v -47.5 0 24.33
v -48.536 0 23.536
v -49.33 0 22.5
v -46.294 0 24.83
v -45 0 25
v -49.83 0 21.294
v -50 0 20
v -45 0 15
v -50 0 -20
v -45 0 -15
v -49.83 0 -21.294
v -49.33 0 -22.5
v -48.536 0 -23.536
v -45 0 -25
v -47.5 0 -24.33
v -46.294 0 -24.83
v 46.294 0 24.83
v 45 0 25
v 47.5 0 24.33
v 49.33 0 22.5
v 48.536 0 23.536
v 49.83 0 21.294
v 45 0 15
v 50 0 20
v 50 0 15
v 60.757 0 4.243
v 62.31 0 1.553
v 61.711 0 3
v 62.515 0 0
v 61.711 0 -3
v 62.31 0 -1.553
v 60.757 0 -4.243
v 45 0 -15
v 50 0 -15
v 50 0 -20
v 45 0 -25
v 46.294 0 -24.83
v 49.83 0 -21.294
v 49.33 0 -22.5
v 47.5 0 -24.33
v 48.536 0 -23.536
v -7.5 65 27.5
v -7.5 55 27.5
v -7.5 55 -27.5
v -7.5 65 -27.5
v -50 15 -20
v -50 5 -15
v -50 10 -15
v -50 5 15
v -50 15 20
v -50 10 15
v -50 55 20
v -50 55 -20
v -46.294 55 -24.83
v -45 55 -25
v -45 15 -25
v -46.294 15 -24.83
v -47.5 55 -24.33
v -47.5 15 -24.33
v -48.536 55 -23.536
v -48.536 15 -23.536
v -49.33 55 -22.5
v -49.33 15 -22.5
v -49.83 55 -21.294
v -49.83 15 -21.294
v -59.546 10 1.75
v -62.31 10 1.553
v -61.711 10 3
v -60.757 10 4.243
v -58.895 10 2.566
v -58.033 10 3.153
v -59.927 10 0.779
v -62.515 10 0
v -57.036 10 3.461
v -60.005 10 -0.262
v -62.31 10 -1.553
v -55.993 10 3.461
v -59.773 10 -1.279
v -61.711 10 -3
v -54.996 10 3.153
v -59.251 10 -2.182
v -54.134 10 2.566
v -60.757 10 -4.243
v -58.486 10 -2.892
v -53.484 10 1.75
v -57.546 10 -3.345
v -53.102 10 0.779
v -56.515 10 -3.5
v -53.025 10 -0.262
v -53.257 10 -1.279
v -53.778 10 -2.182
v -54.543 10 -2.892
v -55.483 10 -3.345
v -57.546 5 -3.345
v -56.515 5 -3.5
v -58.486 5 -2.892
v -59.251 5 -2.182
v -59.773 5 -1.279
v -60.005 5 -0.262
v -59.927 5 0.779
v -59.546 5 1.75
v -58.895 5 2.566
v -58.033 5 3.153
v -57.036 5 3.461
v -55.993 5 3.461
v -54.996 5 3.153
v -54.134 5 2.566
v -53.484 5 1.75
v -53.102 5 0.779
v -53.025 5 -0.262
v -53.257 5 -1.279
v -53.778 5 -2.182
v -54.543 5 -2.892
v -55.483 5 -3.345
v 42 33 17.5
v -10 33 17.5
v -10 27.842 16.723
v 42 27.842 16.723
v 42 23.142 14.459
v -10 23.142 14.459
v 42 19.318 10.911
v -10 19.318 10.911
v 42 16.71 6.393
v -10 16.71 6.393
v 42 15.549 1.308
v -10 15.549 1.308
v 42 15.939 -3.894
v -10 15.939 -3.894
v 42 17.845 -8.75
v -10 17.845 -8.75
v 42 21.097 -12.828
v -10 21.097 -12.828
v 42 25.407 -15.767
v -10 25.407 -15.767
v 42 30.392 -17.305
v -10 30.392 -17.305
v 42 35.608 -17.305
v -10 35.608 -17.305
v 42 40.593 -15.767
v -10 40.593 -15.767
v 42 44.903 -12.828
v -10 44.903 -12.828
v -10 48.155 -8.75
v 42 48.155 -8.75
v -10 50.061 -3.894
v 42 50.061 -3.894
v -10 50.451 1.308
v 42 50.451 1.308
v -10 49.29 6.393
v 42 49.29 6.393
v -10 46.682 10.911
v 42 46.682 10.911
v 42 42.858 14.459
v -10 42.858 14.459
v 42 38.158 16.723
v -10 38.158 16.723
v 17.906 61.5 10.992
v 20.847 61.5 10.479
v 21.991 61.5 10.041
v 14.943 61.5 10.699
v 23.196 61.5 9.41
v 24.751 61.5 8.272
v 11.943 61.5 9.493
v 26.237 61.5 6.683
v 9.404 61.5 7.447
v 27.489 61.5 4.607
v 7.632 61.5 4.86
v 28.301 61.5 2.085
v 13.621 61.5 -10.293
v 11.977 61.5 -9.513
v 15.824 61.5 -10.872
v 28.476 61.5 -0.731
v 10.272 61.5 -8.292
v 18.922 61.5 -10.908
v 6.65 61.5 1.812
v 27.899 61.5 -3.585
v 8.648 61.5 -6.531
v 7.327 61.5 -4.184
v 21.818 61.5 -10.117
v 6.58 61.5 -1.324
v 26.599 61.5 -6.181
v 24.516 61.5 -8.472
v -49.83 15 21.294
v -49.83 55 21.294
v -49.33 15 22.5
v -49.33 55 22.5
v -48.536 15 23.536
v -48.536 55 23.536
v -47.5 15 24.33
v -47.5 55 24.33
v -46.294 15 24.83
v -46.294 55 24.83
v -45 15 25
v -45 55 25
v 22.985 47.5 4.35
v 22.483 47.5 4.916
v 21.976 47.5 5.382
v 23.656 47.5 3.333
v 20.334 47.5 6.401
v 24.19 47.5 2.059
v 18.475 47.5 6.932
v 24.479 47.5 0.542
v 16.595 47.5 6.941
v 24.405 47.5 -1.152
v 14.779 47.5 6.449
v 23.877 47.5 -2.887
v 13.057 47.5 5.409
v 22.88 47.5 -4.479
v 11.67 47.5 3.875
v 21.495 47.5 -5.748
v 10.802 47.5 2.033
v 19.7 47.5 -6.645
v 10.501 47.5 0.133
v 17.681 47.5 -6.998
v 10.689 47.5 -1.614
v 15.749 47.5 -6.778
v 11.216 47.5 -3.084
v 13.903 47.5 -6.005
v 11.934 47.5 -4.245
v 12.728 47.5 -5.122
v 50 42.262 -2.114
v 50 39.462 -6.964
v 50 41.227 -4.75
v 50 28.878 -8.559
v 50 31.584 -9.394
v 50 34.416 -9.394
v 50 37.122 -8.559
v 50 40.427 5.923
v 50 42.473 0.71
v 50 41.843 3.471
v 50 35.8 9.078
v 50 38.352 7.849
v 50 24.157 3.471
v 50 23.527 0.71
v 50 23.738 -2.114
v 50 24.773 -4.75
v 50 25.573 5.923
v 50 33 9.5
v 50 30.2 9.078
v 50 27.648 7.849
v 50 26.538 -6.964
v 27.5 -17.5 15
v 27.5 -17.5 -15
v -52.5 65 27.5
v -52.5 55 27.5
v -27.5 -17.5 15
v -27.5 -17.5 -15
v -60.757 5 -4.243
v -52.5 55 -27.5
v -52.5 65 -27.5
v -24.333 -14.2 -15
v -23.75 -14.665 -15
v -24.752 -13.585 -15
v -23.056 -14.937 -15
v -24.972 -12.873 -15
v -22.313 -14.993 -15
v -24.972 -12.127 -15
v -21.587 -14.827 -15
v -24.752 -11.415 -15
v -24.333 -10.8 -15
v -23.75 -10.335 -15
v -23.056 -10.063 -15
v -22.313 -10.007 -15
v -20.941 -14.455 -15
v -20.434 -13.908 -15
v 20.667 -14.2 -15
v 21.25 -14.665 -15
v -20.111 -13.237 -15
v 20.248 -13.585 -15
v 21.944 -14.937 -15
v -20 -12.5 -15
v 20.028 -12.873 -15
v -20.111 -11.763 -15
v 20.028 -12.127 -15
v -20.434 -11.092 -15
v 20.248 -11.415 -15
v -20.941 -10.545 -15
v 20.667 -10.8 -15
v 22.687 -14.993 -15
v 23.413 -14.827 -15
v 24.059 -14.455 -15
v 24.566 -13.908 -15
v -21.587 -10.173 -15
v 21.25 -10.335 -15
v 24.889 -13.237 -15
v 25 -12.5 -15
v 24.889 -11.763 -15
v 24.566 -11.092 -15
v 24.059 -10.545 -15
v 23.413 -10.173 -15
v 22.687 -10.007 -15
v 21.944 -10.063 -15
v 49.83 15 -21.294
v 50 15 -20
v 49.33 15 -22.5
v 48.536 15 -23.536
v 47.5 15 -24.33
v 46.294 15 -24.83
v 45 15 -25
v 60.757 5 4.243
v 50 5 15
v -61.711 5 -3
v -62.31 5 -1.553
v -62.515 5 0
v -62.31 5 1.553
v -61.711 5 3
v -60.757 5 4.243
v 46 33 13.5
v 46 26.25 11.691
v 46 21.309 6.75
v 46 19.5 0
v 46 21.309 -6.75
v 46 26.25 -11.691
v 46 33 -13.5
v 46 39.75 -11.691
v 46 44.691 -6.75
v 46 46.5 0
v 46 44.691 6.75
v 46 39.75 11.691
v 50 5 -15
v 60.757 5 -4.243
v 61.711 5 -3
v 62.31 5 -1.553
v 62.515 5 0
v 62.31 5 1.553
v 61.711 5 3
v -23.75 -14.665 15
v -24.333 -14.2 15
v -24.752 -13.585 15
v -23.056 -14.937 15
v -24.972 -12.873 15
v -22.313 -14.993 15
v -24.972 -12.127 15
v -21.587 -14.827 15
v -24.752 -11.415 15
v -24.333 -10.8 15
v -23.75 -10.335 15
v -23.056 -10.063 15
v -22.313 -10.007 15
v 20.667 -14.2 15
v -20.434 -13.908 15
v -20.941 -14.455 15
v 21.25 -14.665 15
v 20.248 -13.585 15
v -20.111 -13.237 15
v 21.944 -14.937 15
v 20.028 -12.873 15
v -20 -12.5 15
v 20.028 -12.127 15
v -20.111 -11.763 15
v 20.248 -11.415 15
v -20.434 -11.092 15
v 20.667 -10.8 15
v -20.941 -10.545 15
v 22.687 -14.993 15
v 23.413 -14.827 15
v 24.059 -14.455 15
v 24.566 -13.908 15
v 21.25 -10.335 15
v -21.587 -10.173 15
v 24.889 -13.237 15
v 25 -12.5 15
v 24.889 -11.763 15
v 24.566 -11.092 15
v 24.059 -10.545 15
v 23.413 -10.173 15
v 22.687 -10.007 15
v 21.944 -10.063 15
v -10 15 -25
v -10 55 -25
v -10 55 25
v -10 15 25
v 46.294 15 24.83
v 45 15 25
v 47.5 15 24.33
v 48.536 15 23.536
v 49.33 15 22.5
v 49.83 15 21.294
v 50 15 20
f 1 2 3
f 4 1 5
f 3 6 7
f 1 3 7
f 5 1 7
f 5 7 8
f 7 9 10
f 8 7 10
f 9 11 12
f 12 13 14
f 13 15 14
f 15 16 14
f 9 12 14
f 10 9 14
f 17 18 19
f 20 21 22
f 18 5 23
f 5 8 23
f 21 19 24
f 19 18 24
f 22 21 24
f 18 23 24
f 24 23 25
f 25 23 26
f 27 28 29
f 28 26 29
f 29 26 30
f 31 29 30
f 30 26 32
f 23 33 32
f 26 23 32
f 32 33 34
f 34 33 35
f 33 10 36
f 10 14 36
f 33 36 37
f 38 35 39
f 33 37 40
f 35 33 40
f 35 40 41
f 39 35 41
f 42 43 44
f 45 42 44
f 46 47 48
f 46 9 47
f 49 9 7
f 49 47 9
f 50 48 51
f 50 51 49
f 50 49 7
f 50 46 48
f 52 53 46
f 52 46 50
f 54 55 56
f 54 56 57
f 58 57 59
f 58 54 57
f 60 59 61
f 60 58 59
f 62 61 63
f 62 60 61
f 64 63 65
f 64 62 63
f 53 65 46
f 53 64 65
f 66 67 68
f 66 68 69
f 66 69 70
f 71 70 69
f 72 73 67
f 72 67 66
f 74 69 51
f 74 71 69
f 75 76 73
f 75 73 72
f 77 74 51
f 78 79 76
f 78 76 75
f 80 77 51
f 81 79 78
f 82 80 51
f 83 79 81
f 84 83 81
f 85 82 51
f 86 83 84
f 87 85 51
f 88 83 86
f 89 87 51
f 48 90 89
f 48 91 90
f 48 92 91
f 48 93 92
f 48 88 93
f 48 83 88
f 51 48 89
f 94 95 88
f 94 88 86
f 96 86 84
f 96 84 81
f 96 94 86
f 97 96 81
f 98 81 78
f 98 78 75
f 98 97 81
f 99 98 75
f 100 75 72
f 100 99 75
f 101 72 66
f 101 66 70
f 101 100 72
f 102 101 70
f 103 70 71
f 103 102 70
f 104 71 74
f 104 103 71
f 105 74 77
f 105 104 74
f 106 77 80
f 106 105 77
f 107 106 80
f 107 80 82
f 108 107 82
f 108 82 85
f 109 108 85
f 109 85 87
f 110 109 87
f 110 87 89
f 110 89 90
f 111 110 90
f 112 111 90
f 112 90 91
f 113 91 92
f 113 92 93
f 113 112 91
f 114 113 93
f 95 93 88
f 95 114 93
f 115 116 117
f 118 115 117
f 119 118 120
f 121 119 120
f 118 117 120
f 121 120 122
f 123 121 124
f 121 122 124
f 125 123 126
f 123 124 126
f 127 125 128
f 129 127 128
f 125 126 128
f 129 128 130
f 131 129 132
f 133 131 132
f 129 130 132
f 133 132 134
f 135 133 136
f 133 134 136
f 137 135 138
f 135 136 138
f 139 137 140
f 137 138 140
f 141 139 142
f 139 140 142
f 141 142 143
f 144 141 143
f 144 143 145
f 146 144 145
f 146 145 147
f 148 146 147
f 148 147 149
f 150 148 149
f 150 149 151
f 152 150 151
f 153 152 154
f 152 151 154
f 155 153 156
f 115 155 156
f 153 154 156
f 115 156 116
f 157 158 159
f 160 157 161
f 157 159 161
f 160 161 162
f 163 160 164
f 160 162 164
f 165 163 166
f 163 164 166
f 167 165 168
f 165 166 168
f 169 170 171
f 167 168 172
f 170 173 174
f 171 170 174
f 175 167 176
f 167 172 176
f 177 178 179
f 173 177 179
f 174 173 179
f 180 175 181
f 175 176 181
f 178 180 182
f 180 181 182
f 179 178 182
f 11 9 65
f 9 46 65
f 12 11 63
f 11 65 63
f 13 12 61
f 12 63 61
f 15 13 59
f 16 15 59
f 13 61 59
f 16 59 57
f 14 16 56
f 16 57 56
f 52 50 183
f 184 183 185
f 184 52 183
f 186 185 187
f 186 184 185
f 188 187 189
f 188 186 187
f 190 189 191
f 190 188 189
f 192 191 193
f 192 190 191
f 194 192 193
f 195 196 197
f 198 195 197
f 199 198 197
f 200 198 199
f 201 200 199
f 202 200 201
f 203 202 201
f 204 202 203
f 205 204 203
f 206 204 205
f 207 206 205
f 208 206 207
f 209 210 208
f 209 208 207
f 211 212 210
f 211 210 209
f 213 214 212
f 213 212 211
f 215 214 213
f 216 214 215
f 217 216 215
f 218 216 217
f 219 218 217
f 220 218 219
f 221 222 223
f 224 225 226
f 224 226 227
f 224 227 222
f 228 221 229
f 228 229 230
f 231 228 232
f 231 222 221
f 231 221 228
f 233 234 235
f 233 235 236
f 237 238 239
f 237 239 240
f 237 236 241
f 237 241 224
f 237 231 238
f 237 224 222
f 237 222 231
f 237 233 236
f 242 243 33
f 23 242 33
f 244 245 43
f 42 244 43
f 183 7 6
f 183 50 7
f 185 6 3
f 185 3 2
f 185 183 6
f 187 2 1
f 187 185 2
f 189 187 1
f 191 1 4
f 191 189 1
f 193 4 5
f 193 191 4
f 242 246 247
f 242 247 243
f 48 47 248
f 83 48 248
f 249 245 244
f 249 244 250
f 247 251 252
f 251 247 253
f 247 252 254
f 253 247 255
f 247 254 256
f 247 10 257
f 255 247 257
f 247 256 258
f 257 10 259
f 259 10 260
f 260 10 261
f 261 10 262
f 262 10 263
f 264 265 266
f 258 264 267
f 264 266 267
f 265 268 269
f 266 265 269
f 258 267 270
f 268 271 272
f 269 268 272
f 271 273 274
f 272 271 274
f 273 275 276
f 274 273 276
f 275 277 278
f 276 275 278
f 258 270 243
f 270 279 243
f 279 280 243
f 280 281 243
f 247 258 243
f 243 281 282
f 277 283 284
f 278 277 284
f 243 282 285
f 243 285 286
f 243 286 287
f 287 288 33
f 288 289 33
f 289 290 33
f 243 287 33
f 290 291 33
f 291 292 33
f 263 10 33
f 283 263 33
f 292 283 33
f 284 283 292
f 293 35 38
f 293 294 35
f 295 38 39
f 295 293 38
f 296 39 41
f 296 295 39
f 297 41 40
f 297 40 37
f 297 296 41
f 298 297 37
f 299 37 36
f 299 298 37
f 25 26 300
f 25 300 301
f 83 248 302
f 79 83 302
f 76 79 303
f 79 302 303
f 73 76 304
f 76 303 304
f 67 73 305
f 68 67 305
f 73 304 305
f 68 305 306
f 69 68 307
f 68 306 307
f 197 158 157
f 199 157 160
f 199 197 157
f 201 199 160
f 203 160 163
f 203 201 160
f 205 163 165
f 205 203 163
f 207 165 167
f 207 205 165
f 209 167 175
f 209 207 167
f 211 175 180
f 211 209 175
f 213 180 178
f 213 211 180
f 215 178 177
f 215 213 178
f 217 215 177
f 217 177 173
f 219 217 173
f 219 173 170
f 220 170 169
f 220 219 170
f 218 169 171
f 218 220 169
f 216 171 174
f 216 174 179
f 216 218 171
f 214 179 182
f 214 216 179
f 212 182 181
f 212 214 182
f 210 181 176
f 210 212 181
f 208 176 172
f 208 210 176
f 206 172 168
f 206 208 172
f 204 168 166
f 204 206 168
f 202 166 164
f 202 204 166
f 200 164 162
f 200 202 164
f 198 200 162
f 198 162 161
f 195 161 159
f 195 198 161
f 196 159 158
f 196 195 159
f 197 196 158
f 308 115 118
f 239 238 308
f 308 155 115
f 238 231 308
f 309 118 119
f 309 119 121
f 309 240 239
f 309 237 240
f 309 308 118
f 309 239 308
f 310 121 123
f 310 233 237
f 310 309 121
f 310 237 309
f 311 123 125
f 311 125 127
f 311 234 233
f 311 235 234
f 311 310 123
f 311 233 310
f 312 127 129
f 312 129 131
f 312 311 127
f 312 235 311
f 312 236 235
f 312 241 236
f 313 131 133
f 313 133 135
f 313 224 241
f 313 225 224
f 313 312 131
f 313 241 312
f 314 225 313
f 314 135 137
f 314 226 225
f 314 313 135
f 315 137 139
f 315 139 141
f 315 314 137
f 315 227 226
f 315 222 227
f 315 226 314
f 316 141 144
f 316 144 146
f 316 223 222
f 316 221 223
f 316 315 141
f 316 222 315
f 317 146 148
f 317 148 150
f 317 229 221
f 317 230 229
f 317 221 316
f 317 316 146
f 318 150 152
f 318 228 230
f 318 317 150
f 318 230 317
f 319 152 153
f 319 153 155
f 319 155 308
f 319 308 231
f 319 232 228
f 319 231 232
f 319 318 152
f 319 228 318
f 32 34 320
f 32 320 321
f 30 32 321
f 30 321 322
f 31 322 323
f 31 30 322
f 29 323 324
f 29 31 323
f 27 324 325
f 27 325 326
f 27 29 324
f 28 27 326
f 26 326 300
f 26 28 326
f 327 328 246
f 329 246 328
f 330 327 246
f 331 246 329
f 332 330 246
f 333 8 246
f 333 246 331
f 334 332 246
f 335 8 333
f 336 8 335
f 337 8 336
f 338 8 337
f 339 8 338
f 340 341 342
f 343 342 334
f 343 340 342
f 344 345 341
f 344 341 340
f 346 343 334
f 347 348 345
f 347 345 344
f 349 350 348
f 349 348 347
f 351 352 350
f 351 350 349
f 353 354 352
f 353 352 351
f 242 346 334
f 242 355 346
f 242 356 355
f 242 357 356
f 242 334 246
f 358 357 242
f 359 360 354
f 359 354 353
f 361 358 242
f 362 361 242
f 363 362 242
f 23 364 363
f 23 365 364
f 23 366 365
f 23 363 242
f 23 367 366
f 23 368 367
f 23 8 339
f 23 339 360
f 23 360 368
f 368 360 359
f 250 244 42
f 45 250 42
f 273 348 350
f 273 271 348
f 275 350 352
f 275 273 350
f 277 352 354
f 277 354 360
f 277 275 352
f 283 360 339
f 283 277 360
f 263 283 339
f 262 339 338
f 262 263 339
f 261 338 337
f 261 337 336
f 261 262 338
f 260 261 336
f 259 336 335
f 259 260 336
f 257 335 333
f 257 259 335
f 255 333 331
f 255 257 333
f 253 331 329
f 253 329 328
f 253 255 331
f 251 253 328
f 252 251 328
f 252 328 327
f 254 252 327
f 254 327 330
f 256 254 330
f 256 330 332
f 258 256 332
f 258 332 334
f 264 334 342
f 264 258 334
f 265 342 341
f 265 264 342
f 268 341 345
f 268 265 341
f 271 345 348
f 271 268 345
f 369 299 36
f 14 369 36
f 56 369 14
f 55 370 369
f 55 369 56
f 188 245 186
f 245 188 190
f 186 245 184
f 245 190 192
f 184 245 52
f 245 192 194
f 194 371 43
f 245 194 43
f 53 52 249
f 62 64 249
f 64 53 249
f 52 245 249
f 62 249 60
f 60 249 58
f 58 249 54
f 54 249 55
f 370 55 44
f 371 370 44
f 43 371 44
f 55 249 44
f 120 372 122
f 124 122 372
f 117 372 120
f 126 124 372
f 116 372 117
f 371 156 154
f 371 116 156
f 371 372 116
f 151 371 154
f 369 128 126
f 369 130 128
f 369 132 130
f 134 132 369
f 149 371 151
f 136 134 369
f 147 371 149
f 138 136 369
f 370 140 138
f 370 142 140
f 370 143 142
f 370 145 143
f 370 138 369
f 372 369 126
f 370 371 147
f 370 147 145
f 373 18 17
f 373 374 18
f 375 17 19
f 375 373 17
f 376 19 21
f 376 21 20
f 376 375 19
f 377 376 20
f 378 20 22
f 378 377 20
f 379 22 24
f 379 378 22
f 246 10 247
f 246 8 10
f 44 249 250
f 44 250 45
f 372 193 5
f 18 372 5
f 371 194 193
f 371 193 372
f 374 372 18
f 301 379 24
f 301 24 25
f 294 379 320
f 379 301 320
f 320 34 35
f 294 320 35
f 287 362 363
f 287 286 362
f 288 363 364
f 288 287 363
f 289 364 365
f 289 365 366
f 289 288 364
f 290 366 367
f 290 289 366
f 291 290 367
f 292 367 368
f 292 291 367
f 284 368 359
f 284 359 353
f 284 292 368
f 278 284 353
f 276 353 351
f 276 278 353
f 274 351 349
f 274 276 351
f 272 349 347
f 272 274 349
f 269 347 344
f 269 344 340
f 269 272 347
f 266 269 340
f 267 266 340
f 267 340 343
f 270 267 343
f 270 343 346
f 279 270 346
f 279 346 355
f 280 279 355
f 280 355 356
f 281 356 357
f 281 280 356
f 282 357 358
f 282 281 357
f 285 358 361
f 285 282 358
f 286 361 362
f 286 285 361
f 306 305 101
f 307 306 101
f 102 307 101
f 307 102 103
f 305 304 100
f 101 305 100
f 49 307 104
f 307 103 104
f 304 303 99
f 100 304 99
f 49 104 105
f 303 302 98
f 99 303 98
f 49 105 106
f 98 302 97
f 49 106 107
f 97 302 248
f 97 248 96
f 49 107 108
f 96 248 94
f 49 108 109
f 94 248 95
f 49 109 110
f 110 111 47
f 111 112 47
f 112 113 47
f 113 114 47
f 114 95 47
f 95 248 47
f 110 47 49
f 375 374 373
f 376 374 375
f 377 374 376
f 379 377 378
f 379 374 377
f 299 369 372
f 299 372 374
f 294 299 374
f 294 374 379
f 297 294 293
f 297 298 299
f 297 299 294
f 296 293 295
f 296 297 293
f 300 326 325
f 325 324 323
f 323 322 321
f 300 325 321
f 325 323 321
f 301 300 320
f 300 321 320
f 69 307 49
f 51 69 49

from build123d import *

# Parameters (mm, degrees)
SKETCH1_W           = 100
SKETCH1_H           = 50
BOSS_EXTRUDE1_DEPTH = 15
SHELL1_T            = -5
FILLET1_R           = 5
SKETCH2_R           = 2.5
BOSS_EXTRUDE2_DEPTH = 15
BOSS_EXTRUDE3_DEPTH = 5
BOSS_EXTRUDE4_START = 5
SKETCH4_R           = 3.5
BOSS_EXTRUDE4_DEPTH = 5
SKETCH5_W           = 90
SKETCH5_H           = 40
BOSS_EXTRUDE5_DEPTH = 10
BOSS_EXTRUDE6_START = 40
BOSS_EXTRUDE6_DEPTH = 40
SKETCH7_W           = 45
SKETCH7_H           = 55
BOSS_EXTRUDE7_DEPTH = 10
SKETCH8_R           = 17.5
BOSS_EXTRUDE8_DEPTH = 60
CHAMFER1_SIZE       = 8


with BuildPart() as part:
    # Sketch1 → Boss-Extrude1 (new body)
    with BuildSketch(Plane(origin=(0, 0, 0), x_dir=(1, 0, 0), z_dir=(0, 1, 0))):
        Rectangle(SKETCH1_W, SKETCH1_H)
    extrude(amount=BOSS_EXTRUDE1_DEPTH)

    # Shell1
    shell1_openings = [part.faces().sort_by_distance(p)[0] for p in [
        (0, 15, 0),
    ]]
    offset(amount=SHELL1_T, openings=shell1_openings, kind=Kind.INTERSECTION)

    # Fillet1
    fillet1_edges = [part.edges().sort_by_distance(p)[0] for p in [
        (50, 7.5, 25),
        (-50, 7.5, 25),
        (-50, 7.5, -25),
        (50, 7.5, -25),
    ]]
    fillet(fillet1_edges, radius=FILLET1_R)

    # Sketch2 → Boss-Extrude2 (add, symmetric)
    with BuildSketch(Plane.XY):
        Polygon((-45, 0), (-27.5, -17.5), (27.5, -17.5), (45, 0), align=None)
        with Locations((-22.5, -12.5)):
            Circle(SKETCH2_R, mode=Mode.SUBTRACT)
        with Locations((22.5, -12.5)):
            Circle(SKETCH2_R, mode=Mode.SUBTRACT)
    extrude(amount=BOSS_EXTRUDE2_DEPTH, both=True)

    # Sketch3 → Boss-Extrude3 (add)
    with BuildSketch(Plane(origin=(0, 0, 0), x_dir=(1, 0, 0), z_dir=(0, 1, 0))):
        with BuildLine():
            Line((50, 15), (60.757359313, 4.242640687))
            ThreePointArc((60.757359313, 4.242640687), (62.514718626, 0), (60.757359313, -4.242640687))
            Line((60.757359313, -4.242640687), (50, -15))
            Line((50, -15), (50, 15))
        make_face()
    extrude(amount=BOSS_EXTRUDE3_DEPTH)

    # Sketch4 → Boss-Extrude4 (add)
    with BuildSketch(Plane(origin=(0, 0, 0), x_dir=(1, 0, 0), z_dir=(0, 1, 0)).offset(BOSS_EXTRUDE4_START)):
        with BuildLine():
            Line((-50, 15), (-60.757359313, 4.242640687))
            ThreePointArc((-60.757359313, 4.242640687), (-62.514718626, 0), (-60.757359313, -4.242640687))
            Line((-60.757359313, -4.242640687), (-50, -15))
            Line((-50, -15), (-50, 15))
        make_face()
        with Locations(Location((-56.514718626, 0, 0), (0, 0, 90))):
            Circle(SKETCH4_R, mode=Mode.SUBTRACT)
    extrude(amount=BOSS_EXTRUDE4_DEPTH)

    # Sketch5 → Boss-Extrude5 (add)
    with BuildSketch(Plane(origin=(0, 5, 0), x_dir=(1, 0, 0), z_dir=(0, 1, 0))):
        Rectangle(SKETCH5_W, SKETCH5_H)
    extrude(amount=BOSS_EXTRUDE5_DEPTH)

    # Sketch6 → Boss-Extrude6 (add)
    with BuildSketch(Plane(origin=(0, 15, 0), x_dir=(1, 0, 0), z_dir=(0, 1, 0)).offset(BOSS_EXTRUDE6_START)):
        with BuildLine():
            Line((-45, -25), (-10, -25))
            Line((-10, -25), (-10, 25))
            Line((-10, 25), (-45, 25))
            ThreePointArc((-45, 25), (-48.535533906, 23.535533906), (-50, 20))
            Line((-50, 20), (-50, -20))
            ThreePointArc((-50, -20), (-48.535533906, -23.535533906), (-45, -25))
        make_face()
    extrude(amount=-BOSS_EXTRUDE6_DEPTH)

    # Sketch7 → Boss-Extrude7 (add)
    with BuildSketch(Plane(origin=(0, 55, 0), x_dir=(1, 0, 0), z_dir=(0, 1, 0))):
        with Locations((-30, 0)):
            Rectangle(SKETCH7_W, SKETCH7_H)
    extrude(amount=BOSS_EXTRUDE7_DEPTH)

    # Sketch8 → Boss-Extrude8 (add)
    with BuildSketch(Plane(origin=(-10, 0, 0), x_dir=(0, 0, -1), z_dir=(1, 0, 0))):
        with Locations(Location((0, 33, 0), (0, 0, 180))):
            Circle(SKETCH8_R)
    extrude(amount=BOSS_EXTRUDE8_DEPTH)

    # Chamfer1
    chamfer1_edges = [part.edges().sort_by_distance(p)[0] for p in [
        (50, 33, -17.5),
    ]]
    chamfer(chamfer1_edges, length=CHAMFER1_SIZE)


with BuildPart() as body_2:
    # Loft1: read off the stored shape, not the designer's step
    # Loft1: loft between two sections, ruled curve by curve
    loft1_from = [
        Edge.make_bspline([(20.846558371, 61.5, 10.478575622), (-0.110592873, 61.5, 17.171692365), (-6.803709615, 61.5, -3.785458879), (14.153441629, 61.5, -10.478575622), (35.110592873, 61.5, -17.171692365), (41.803709615, 61.5, 3.785458879), (20.846558371, 61.5, 10.478575622)], [0, 0, 0, 0, 0.5, 0.5, 0.5, 1, 1, 1, 1], 3, [1, 0.333333333, 0.333333333, 1, 0.333333333, 0.333333333, 1]),
    ]
    loft1_to = [
        Edge.make_bspline([(21.975509399, 47.5, 5.382361528), (11.210786342, 47.5, 14.333380326), (2.259767545, 47.5, 3.568657269), (13.024490601, 47.5, -5.382361528), (23.789213658, 47.5, -14.333380326), (32.740232455, 47.5, -3.568657269), (21.975509399, 47.5, 5.382361528)], [0, 0, 0, 0, 0.5, 0.5, 0.5, 1, 1, 1, 1], 3, [1, 0.333333333, 0.333333333, 1, 0.333333333, 0.333333333, 1]),
    ]
    loft1 = Solid(Shell([*[Face.make_surface_from_curves(loft1_from[k], loft1_to[k]) for k in range(1)], Face(Wire(loft1_from)), Face(Wire(loft1_to))]))
    add(loft1)


solid = Compound([part.part, body_2.part])
